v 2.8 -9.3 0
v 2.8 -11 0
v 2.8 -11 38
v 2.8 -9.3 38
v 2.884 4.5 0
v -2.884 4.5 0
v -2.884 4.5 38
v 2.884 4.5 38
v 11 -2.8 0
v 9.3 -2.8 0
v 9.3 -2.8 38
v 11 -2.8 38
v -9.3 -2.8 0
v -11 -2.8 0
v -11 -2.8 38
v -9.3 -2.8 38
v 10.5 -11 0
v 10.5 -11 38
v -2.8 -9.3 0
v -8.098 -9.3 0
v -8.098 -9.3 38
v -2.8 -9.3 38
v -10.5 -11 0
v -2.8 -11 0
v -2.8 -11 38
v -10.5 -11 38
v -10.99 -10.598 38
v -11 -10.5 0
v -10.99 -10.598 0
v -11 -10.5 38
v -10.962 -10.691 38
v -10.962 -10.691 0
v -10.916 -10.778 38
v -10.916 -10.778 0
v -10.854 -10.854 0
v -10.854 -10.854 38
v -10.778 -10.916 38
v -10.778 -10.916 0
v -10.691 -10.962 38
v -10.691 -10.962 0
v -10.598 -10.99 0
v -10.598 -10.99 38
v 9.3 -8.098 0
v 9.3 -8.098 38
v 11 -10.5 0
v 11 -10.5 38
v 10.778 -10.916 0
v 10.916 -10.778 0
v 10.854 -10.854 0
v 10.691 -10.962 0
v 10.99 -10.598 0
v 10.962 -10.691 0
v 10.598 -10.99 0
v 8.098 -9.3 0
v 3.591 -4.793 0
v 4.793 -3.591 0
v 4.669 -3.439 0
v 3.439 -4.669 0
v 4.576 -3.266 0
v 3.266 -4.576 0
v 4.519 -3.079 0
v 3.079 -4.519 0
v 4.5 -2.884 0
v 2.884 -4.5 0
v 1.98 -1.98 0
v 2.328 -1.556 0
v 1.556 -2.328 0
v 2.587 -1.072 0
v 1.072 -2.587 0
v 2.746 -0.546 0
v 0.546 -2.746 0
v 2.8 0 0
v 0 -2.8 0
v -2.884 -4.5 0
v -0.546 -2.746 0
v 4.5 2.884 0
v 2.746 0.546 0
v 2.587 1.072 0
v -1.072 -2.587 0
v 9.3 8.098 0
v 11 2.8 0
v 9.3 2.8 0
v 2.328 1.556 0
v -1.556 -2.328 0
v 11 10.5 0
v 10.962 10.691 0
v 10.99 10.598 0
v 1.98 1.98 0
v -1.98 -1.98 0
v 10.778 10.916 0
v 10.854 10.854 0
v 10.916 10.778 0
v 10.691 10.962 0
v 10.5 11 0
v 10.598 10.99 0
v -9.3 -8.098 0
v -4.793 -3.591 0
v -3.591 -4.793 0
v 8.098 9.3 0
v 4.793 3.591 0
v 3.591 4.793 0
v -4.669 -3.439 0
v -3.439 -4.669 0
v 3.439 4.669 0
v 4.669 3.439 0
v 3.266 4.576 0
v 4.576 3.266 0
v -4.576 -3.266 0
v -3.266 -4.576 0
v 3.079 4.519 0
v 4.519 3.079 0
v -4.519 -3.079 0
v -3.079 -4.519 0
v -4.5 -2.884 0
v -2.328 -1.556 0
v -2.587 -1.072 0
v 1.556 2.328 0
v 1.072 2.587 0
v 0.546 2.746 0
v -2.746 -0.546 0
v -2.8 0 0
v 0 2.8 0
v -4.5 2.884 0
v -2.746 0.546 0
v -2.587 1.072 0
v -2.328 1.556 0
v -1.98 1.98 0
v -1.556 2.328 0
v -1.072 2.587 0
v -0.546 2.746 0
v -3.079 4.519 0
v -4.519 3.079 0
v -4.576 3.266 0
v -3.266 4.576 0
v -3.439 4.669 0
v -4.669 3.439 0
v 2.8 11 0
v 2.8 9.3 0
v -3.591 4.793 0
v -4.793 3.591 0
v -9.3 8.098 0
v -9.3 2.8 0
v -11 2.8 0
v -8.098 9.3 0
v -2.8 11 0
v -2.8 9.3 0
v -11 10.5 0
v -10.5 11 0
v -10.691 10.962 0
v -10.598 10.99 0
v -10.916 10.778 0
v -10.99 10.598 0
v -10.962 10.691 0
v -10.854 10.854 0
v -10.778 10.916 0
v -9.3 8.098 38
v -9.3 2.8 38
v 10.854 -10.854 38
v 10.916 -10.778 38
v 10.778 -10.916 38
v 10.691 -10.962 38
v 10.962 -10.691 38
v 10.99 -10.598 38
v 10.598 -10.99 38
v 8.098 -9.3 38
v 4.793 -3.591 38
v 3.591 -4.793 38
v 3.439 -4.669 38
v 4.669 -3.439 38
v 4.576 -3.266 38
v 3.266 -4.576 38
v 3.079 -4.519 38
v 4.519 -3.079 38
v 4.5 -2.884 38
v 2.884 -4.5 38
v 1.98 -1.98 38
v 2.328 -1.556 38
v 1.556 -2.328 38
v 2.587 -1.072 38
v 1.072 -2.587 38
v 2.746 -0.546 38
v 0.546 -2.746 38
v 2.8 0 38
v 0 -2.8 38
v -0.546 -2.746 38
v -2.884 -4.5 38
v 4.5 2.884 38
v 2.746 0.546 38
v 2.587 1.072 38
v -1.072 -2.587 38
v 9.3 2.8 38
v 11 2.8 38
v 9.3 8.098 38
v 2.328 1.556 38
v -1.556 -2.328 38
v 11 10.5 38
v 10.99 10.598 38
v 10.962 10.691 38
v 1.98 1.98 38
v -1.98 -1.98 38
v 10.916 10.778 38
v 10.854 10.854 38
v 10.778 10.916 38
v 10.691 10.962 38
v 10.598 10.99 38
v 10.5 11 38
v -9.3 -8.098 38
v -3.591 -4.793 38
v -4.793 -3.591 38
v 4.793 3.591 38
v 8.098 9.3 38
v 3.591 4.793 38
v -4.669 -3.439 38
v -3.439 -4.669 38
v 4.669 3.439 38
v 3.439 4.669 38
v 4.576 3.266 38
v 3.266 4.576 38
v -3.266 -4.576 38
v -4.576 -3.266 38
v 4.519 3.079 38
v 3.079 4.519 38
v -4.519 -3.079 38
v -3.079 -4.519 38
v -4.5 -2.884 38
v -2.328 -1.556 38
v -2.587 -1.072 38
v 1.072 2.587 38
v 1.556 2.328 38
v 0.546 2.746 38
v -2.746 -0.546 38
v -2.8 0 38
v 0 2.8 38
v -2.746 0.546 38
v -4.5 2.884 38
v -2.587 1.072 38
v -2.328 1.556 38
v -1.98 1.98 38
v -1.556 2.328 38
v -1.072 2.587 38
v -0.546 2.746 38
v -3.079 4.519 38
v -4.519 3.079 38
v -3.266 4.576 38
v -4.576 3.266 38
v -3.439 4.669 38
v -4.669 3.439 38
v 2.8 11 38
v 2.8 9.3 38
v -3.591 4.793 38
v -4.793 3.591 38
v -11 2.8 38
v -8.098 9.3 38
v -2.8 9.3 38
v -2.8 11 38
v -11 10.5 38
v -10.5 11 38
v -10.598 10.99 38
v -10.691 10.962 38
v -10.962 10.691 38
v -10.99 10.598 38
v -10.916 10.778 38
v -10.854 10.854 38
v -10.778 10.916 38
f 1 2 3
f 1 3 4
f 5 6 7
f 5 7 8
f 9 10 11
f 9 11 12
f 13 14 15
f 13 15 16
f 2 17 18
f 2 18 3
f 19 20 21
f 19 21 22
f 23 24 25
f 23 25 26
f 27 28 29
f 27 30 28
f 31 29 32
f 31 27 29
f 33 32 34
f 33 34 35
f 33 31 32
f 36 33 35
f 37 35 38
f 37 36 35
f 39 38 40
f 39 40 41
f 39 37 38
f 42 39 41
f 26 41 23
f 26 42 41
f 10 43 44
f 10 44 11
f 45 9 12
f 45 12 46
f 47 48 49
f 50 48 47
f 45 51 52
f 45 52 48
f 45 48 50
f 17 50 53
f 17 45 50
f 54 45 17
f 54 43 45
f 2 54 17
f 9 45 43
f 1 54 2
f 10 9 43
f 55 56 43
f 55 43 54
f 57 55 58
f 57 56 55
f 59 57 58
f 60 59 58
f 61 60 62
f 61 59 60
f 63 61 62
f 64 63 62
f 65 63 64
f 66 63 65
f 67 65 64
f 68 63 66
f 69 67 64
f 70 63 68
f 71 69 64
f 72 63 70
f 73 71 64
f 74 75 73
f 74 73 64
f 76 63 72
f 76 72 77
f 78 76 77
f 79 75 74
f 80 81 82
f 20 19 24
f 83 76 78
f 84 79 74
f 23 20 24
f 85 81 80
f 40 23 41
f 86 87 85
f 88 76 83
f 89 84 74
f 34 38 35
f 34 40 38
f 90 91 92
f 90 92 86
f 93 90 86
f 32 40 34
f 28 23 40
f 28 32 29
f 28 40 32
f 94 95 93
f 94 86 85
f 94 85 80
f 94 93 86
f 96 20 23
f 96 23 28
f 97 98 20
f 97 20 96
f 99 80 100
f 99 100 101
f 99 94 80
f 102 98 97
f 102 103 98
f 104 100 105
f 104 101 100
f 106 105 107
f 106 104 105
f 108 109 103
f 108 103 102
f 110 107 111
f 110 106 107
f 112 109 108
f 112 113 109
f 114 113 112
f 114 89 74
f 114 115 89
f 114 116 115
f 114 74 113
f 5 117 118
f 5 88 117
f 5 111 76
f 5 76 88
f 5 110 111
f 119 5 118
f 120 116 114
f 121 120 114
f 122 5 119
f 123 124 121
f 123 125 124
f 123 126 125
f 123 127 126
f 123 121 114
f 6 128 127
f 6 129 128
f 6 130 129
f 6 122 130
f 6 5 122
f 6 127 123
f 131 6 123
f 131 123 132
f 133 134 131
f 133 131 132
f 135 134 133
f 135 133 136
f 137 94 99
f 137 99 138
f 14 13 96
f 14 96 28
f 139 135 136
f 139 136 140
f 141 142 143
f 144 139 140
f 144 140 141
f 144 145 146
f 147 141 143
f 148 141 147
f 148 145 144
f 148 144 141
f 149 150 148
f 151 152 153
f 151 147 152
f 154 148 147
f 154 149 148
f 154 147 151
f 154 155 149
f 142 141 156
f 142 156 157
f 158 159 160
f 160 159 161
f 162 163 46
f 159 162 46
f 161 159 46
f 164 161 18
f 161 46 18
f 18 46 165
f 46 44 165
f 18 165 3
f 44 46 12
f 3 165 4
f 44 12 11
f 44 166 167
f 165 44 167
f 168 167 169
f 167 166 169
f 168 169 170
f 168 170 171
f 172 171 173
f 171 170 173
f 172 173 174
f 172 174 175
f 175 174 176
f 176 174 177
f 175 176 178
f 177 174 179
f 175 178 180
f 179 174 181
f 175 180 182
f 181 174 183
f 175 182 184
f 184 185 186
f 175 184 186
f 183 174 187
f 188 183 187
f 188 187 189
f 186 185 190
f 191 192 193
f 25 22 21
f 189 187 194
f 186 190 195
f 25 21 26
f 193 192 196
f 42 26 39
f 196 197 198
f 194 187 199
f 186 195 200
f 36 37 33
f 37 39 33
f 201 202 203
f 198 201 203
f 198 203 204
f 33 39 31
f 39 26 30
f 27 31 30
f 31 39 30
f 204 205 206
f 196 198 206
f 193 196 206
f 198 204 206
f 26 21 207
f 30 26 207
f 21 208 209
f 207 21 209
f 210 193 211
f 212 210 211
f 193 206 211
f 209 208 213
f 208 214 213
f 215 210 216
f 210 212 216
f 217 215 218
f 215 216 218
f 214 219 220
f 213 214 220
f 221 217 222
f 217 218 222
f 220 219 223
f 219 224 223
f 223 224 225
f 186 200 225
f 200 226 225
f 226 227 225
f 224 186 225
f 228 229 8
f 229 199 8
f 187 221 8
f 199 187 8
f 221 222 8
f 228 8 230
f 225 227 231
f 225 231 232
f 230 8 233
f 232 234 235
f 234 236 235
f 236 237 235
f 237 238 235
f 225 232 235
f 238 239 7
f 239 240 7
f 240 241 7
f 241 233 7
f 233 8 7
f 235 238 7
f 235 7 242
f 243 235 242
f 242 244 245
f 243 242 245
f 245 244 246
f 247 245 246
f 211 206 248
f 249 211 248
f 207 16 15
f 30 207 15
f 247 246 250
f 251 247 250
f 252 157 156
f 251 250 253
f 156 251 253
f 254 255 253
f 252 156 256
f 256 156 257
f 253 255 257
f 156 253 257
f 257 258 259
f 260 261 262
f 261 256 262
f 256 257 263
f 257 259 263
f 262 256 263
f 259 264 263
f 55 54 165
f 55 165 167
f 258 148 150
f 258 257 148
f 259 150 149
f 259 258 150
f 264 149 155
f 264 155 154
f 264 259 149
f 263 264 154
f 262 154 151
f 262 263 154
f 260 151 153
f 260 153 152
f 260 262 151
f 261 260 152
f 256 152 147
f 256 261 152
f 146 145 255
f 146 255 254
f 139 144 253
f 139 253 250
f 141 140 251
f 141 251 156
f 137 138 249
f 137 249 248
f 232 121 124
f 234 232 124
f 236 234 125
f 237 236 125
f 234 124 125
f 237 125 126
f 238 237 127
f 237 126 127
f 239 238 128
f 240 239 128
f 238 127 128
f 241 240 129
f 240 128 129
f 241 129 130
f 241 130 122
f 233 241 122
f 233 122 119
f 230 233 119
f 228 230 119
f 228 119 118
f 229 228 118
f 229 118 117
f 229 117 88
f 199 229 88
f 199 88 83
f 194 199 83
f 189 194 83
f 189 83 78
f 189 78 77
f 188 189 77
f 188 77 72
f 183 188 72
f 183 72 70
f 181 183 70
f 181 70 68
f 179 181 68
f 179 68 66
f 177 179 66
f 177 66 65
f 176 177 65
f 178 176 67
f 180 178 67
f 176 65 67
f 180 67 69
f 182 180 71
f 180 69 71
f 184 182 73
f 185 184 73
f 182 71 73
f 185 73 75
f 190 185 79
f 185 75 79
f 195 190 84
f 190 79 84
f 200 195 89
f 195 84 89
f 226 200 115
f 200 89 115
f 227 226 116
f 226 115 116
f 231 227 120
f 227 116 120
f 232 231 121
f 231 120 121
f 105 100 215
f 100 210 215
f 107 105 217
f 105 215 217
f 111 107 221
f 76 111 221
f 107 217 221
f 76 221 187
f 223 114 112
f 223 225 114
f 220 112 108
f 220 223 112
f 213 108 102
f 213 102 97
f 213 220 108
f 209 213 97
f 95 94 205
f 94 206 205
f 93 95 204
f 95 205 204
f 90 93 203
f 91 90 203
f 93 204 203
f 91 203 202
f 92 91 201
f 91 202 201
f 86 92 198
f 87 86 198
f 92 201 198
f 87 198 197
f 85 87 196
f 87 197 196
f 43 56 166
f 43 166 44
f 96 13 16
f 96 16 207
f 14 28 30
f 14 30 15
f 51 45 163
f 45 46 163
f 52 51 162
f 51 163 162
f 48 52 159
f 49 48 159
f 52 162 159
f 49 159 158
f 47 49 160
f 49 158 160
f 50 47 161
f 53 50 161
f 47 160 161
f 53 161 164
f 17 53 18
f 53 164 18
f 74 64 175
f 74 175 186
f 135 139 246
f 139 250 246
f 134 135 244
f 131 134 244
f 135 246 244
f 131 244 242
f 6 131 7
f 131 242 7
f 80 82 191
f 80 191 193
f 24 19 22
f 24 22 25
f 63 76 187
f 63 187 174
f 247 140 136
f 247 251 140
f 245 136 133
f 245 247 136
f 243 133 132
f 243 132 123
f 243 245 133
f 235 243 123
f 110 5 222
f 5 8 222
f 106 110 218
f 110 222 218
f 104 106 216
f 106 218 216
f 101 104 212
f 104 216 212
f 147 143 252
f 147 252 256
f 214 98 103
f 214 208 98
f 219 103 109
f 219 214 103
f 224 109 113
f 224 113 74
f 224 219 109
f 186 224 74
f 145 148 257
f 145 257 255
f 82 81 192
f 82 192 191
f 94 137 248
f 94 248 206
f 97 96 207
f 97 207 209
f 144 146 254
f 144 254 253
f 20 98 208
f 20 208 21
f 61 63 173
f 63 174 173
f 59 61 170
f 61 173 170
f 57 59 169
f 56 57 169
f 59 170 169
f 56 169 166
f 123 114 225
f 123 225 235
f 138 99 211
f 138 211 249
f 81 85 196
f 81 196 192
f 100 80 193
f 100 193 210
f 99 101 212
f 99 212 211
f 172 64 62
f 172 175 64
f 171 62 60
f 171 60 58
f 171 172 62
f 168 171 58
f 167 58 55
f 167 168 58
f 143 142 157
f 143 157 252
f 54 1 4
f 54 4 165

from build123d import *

# Parameters (mm, degrees)
EXTRUSION1_DEPTH        = 38
ESQUISSE2_R             = 2.8
ENL_V_MAT_EXTRU_1_DEPTH = 39
CONG_1_R                = 0.5
CONG_2_R                = 1


with BuildPart() as part:
    # Esquisse1 → Extrusion1 (new body)
    with BuildSketch(Plane.XY):
        Polygon((-2.8, 11), (-2.8, 9.3), (-8.097918472, 9.3), (-3.297918472, 4.5), (3.297918472, 4.5), (8.097918472, 9.3), (2.8, 9.3), (2.8, 11), (11, 11), (11, 2.8), (9.3, 2.8), (9.3, 8.097918472), (4.5, 3.297918472), (4.5, -3.297918472), (9.3, -8.097918472), (9.3, -2.8), (11, -2.8), (11, -11), (2.8, -11), (2.8, -9.3), (8.097918472, -9.3), (3.297918472, -4.5), (-3.297918472, -4.5), (-8.097918472, -9.3), (-2.8, -9.3), (-2.8, -11), (-11, -11), (-11, -2.8), (-9.3, -2.8), (-9.3, -8.097918472), (-4.5, -3.297918472), (-4.5, 3.297918472), (-9.3, 8.097918472), (-9.3, 2.8), (-11, 2.8), (-11, 11), align=None)
    extrude(amount=EXTRUSION1_DEPTH)

    # Esquisse2 → Enlèv. mat.-Extru.1 (cut, through all)
    with BuildSketch(Plane(origin=(0, 0, 0), x_dir=(-1, 0, 0), z_dir=(0, 0, -1))):
        Circle(ESQUISSE2_R)
    extrude(amount=-ENL_V_MAT_EXTRU_1_DEPTH, mode=Mode.SUBTRACT)

    # Congé1
    cong_1_edges = [part.edges().sort_by_distance(p)[0] for p in [
        (-11, 11, 19),
        (11, 11, 19),
        (11, -11, 19),
        (-11, -11, 19),
    ]]
    fillet(cong_1_edges, radius=CONG_1_R)

    # Congé2
    cong_2_edges = [part.edges().sort_by_distance(p)[0] for p in [
        (-4.5, -3.297918472, 19),
        (-4.5, 3.297918472, 19),
        (-3.297918472, 4.5, 19),
        (3.297918472, 4.5, 19),
        (4.5, 3.297918472, 19),
        (4.5, -3.297918472, 19),
        (3.297918472, -4.5, 19),
        (-3.297918472, -4.5, 19),
    ]]
    fillet(cong_2_edges, radius=CONG_2_R)


solid = part.part
